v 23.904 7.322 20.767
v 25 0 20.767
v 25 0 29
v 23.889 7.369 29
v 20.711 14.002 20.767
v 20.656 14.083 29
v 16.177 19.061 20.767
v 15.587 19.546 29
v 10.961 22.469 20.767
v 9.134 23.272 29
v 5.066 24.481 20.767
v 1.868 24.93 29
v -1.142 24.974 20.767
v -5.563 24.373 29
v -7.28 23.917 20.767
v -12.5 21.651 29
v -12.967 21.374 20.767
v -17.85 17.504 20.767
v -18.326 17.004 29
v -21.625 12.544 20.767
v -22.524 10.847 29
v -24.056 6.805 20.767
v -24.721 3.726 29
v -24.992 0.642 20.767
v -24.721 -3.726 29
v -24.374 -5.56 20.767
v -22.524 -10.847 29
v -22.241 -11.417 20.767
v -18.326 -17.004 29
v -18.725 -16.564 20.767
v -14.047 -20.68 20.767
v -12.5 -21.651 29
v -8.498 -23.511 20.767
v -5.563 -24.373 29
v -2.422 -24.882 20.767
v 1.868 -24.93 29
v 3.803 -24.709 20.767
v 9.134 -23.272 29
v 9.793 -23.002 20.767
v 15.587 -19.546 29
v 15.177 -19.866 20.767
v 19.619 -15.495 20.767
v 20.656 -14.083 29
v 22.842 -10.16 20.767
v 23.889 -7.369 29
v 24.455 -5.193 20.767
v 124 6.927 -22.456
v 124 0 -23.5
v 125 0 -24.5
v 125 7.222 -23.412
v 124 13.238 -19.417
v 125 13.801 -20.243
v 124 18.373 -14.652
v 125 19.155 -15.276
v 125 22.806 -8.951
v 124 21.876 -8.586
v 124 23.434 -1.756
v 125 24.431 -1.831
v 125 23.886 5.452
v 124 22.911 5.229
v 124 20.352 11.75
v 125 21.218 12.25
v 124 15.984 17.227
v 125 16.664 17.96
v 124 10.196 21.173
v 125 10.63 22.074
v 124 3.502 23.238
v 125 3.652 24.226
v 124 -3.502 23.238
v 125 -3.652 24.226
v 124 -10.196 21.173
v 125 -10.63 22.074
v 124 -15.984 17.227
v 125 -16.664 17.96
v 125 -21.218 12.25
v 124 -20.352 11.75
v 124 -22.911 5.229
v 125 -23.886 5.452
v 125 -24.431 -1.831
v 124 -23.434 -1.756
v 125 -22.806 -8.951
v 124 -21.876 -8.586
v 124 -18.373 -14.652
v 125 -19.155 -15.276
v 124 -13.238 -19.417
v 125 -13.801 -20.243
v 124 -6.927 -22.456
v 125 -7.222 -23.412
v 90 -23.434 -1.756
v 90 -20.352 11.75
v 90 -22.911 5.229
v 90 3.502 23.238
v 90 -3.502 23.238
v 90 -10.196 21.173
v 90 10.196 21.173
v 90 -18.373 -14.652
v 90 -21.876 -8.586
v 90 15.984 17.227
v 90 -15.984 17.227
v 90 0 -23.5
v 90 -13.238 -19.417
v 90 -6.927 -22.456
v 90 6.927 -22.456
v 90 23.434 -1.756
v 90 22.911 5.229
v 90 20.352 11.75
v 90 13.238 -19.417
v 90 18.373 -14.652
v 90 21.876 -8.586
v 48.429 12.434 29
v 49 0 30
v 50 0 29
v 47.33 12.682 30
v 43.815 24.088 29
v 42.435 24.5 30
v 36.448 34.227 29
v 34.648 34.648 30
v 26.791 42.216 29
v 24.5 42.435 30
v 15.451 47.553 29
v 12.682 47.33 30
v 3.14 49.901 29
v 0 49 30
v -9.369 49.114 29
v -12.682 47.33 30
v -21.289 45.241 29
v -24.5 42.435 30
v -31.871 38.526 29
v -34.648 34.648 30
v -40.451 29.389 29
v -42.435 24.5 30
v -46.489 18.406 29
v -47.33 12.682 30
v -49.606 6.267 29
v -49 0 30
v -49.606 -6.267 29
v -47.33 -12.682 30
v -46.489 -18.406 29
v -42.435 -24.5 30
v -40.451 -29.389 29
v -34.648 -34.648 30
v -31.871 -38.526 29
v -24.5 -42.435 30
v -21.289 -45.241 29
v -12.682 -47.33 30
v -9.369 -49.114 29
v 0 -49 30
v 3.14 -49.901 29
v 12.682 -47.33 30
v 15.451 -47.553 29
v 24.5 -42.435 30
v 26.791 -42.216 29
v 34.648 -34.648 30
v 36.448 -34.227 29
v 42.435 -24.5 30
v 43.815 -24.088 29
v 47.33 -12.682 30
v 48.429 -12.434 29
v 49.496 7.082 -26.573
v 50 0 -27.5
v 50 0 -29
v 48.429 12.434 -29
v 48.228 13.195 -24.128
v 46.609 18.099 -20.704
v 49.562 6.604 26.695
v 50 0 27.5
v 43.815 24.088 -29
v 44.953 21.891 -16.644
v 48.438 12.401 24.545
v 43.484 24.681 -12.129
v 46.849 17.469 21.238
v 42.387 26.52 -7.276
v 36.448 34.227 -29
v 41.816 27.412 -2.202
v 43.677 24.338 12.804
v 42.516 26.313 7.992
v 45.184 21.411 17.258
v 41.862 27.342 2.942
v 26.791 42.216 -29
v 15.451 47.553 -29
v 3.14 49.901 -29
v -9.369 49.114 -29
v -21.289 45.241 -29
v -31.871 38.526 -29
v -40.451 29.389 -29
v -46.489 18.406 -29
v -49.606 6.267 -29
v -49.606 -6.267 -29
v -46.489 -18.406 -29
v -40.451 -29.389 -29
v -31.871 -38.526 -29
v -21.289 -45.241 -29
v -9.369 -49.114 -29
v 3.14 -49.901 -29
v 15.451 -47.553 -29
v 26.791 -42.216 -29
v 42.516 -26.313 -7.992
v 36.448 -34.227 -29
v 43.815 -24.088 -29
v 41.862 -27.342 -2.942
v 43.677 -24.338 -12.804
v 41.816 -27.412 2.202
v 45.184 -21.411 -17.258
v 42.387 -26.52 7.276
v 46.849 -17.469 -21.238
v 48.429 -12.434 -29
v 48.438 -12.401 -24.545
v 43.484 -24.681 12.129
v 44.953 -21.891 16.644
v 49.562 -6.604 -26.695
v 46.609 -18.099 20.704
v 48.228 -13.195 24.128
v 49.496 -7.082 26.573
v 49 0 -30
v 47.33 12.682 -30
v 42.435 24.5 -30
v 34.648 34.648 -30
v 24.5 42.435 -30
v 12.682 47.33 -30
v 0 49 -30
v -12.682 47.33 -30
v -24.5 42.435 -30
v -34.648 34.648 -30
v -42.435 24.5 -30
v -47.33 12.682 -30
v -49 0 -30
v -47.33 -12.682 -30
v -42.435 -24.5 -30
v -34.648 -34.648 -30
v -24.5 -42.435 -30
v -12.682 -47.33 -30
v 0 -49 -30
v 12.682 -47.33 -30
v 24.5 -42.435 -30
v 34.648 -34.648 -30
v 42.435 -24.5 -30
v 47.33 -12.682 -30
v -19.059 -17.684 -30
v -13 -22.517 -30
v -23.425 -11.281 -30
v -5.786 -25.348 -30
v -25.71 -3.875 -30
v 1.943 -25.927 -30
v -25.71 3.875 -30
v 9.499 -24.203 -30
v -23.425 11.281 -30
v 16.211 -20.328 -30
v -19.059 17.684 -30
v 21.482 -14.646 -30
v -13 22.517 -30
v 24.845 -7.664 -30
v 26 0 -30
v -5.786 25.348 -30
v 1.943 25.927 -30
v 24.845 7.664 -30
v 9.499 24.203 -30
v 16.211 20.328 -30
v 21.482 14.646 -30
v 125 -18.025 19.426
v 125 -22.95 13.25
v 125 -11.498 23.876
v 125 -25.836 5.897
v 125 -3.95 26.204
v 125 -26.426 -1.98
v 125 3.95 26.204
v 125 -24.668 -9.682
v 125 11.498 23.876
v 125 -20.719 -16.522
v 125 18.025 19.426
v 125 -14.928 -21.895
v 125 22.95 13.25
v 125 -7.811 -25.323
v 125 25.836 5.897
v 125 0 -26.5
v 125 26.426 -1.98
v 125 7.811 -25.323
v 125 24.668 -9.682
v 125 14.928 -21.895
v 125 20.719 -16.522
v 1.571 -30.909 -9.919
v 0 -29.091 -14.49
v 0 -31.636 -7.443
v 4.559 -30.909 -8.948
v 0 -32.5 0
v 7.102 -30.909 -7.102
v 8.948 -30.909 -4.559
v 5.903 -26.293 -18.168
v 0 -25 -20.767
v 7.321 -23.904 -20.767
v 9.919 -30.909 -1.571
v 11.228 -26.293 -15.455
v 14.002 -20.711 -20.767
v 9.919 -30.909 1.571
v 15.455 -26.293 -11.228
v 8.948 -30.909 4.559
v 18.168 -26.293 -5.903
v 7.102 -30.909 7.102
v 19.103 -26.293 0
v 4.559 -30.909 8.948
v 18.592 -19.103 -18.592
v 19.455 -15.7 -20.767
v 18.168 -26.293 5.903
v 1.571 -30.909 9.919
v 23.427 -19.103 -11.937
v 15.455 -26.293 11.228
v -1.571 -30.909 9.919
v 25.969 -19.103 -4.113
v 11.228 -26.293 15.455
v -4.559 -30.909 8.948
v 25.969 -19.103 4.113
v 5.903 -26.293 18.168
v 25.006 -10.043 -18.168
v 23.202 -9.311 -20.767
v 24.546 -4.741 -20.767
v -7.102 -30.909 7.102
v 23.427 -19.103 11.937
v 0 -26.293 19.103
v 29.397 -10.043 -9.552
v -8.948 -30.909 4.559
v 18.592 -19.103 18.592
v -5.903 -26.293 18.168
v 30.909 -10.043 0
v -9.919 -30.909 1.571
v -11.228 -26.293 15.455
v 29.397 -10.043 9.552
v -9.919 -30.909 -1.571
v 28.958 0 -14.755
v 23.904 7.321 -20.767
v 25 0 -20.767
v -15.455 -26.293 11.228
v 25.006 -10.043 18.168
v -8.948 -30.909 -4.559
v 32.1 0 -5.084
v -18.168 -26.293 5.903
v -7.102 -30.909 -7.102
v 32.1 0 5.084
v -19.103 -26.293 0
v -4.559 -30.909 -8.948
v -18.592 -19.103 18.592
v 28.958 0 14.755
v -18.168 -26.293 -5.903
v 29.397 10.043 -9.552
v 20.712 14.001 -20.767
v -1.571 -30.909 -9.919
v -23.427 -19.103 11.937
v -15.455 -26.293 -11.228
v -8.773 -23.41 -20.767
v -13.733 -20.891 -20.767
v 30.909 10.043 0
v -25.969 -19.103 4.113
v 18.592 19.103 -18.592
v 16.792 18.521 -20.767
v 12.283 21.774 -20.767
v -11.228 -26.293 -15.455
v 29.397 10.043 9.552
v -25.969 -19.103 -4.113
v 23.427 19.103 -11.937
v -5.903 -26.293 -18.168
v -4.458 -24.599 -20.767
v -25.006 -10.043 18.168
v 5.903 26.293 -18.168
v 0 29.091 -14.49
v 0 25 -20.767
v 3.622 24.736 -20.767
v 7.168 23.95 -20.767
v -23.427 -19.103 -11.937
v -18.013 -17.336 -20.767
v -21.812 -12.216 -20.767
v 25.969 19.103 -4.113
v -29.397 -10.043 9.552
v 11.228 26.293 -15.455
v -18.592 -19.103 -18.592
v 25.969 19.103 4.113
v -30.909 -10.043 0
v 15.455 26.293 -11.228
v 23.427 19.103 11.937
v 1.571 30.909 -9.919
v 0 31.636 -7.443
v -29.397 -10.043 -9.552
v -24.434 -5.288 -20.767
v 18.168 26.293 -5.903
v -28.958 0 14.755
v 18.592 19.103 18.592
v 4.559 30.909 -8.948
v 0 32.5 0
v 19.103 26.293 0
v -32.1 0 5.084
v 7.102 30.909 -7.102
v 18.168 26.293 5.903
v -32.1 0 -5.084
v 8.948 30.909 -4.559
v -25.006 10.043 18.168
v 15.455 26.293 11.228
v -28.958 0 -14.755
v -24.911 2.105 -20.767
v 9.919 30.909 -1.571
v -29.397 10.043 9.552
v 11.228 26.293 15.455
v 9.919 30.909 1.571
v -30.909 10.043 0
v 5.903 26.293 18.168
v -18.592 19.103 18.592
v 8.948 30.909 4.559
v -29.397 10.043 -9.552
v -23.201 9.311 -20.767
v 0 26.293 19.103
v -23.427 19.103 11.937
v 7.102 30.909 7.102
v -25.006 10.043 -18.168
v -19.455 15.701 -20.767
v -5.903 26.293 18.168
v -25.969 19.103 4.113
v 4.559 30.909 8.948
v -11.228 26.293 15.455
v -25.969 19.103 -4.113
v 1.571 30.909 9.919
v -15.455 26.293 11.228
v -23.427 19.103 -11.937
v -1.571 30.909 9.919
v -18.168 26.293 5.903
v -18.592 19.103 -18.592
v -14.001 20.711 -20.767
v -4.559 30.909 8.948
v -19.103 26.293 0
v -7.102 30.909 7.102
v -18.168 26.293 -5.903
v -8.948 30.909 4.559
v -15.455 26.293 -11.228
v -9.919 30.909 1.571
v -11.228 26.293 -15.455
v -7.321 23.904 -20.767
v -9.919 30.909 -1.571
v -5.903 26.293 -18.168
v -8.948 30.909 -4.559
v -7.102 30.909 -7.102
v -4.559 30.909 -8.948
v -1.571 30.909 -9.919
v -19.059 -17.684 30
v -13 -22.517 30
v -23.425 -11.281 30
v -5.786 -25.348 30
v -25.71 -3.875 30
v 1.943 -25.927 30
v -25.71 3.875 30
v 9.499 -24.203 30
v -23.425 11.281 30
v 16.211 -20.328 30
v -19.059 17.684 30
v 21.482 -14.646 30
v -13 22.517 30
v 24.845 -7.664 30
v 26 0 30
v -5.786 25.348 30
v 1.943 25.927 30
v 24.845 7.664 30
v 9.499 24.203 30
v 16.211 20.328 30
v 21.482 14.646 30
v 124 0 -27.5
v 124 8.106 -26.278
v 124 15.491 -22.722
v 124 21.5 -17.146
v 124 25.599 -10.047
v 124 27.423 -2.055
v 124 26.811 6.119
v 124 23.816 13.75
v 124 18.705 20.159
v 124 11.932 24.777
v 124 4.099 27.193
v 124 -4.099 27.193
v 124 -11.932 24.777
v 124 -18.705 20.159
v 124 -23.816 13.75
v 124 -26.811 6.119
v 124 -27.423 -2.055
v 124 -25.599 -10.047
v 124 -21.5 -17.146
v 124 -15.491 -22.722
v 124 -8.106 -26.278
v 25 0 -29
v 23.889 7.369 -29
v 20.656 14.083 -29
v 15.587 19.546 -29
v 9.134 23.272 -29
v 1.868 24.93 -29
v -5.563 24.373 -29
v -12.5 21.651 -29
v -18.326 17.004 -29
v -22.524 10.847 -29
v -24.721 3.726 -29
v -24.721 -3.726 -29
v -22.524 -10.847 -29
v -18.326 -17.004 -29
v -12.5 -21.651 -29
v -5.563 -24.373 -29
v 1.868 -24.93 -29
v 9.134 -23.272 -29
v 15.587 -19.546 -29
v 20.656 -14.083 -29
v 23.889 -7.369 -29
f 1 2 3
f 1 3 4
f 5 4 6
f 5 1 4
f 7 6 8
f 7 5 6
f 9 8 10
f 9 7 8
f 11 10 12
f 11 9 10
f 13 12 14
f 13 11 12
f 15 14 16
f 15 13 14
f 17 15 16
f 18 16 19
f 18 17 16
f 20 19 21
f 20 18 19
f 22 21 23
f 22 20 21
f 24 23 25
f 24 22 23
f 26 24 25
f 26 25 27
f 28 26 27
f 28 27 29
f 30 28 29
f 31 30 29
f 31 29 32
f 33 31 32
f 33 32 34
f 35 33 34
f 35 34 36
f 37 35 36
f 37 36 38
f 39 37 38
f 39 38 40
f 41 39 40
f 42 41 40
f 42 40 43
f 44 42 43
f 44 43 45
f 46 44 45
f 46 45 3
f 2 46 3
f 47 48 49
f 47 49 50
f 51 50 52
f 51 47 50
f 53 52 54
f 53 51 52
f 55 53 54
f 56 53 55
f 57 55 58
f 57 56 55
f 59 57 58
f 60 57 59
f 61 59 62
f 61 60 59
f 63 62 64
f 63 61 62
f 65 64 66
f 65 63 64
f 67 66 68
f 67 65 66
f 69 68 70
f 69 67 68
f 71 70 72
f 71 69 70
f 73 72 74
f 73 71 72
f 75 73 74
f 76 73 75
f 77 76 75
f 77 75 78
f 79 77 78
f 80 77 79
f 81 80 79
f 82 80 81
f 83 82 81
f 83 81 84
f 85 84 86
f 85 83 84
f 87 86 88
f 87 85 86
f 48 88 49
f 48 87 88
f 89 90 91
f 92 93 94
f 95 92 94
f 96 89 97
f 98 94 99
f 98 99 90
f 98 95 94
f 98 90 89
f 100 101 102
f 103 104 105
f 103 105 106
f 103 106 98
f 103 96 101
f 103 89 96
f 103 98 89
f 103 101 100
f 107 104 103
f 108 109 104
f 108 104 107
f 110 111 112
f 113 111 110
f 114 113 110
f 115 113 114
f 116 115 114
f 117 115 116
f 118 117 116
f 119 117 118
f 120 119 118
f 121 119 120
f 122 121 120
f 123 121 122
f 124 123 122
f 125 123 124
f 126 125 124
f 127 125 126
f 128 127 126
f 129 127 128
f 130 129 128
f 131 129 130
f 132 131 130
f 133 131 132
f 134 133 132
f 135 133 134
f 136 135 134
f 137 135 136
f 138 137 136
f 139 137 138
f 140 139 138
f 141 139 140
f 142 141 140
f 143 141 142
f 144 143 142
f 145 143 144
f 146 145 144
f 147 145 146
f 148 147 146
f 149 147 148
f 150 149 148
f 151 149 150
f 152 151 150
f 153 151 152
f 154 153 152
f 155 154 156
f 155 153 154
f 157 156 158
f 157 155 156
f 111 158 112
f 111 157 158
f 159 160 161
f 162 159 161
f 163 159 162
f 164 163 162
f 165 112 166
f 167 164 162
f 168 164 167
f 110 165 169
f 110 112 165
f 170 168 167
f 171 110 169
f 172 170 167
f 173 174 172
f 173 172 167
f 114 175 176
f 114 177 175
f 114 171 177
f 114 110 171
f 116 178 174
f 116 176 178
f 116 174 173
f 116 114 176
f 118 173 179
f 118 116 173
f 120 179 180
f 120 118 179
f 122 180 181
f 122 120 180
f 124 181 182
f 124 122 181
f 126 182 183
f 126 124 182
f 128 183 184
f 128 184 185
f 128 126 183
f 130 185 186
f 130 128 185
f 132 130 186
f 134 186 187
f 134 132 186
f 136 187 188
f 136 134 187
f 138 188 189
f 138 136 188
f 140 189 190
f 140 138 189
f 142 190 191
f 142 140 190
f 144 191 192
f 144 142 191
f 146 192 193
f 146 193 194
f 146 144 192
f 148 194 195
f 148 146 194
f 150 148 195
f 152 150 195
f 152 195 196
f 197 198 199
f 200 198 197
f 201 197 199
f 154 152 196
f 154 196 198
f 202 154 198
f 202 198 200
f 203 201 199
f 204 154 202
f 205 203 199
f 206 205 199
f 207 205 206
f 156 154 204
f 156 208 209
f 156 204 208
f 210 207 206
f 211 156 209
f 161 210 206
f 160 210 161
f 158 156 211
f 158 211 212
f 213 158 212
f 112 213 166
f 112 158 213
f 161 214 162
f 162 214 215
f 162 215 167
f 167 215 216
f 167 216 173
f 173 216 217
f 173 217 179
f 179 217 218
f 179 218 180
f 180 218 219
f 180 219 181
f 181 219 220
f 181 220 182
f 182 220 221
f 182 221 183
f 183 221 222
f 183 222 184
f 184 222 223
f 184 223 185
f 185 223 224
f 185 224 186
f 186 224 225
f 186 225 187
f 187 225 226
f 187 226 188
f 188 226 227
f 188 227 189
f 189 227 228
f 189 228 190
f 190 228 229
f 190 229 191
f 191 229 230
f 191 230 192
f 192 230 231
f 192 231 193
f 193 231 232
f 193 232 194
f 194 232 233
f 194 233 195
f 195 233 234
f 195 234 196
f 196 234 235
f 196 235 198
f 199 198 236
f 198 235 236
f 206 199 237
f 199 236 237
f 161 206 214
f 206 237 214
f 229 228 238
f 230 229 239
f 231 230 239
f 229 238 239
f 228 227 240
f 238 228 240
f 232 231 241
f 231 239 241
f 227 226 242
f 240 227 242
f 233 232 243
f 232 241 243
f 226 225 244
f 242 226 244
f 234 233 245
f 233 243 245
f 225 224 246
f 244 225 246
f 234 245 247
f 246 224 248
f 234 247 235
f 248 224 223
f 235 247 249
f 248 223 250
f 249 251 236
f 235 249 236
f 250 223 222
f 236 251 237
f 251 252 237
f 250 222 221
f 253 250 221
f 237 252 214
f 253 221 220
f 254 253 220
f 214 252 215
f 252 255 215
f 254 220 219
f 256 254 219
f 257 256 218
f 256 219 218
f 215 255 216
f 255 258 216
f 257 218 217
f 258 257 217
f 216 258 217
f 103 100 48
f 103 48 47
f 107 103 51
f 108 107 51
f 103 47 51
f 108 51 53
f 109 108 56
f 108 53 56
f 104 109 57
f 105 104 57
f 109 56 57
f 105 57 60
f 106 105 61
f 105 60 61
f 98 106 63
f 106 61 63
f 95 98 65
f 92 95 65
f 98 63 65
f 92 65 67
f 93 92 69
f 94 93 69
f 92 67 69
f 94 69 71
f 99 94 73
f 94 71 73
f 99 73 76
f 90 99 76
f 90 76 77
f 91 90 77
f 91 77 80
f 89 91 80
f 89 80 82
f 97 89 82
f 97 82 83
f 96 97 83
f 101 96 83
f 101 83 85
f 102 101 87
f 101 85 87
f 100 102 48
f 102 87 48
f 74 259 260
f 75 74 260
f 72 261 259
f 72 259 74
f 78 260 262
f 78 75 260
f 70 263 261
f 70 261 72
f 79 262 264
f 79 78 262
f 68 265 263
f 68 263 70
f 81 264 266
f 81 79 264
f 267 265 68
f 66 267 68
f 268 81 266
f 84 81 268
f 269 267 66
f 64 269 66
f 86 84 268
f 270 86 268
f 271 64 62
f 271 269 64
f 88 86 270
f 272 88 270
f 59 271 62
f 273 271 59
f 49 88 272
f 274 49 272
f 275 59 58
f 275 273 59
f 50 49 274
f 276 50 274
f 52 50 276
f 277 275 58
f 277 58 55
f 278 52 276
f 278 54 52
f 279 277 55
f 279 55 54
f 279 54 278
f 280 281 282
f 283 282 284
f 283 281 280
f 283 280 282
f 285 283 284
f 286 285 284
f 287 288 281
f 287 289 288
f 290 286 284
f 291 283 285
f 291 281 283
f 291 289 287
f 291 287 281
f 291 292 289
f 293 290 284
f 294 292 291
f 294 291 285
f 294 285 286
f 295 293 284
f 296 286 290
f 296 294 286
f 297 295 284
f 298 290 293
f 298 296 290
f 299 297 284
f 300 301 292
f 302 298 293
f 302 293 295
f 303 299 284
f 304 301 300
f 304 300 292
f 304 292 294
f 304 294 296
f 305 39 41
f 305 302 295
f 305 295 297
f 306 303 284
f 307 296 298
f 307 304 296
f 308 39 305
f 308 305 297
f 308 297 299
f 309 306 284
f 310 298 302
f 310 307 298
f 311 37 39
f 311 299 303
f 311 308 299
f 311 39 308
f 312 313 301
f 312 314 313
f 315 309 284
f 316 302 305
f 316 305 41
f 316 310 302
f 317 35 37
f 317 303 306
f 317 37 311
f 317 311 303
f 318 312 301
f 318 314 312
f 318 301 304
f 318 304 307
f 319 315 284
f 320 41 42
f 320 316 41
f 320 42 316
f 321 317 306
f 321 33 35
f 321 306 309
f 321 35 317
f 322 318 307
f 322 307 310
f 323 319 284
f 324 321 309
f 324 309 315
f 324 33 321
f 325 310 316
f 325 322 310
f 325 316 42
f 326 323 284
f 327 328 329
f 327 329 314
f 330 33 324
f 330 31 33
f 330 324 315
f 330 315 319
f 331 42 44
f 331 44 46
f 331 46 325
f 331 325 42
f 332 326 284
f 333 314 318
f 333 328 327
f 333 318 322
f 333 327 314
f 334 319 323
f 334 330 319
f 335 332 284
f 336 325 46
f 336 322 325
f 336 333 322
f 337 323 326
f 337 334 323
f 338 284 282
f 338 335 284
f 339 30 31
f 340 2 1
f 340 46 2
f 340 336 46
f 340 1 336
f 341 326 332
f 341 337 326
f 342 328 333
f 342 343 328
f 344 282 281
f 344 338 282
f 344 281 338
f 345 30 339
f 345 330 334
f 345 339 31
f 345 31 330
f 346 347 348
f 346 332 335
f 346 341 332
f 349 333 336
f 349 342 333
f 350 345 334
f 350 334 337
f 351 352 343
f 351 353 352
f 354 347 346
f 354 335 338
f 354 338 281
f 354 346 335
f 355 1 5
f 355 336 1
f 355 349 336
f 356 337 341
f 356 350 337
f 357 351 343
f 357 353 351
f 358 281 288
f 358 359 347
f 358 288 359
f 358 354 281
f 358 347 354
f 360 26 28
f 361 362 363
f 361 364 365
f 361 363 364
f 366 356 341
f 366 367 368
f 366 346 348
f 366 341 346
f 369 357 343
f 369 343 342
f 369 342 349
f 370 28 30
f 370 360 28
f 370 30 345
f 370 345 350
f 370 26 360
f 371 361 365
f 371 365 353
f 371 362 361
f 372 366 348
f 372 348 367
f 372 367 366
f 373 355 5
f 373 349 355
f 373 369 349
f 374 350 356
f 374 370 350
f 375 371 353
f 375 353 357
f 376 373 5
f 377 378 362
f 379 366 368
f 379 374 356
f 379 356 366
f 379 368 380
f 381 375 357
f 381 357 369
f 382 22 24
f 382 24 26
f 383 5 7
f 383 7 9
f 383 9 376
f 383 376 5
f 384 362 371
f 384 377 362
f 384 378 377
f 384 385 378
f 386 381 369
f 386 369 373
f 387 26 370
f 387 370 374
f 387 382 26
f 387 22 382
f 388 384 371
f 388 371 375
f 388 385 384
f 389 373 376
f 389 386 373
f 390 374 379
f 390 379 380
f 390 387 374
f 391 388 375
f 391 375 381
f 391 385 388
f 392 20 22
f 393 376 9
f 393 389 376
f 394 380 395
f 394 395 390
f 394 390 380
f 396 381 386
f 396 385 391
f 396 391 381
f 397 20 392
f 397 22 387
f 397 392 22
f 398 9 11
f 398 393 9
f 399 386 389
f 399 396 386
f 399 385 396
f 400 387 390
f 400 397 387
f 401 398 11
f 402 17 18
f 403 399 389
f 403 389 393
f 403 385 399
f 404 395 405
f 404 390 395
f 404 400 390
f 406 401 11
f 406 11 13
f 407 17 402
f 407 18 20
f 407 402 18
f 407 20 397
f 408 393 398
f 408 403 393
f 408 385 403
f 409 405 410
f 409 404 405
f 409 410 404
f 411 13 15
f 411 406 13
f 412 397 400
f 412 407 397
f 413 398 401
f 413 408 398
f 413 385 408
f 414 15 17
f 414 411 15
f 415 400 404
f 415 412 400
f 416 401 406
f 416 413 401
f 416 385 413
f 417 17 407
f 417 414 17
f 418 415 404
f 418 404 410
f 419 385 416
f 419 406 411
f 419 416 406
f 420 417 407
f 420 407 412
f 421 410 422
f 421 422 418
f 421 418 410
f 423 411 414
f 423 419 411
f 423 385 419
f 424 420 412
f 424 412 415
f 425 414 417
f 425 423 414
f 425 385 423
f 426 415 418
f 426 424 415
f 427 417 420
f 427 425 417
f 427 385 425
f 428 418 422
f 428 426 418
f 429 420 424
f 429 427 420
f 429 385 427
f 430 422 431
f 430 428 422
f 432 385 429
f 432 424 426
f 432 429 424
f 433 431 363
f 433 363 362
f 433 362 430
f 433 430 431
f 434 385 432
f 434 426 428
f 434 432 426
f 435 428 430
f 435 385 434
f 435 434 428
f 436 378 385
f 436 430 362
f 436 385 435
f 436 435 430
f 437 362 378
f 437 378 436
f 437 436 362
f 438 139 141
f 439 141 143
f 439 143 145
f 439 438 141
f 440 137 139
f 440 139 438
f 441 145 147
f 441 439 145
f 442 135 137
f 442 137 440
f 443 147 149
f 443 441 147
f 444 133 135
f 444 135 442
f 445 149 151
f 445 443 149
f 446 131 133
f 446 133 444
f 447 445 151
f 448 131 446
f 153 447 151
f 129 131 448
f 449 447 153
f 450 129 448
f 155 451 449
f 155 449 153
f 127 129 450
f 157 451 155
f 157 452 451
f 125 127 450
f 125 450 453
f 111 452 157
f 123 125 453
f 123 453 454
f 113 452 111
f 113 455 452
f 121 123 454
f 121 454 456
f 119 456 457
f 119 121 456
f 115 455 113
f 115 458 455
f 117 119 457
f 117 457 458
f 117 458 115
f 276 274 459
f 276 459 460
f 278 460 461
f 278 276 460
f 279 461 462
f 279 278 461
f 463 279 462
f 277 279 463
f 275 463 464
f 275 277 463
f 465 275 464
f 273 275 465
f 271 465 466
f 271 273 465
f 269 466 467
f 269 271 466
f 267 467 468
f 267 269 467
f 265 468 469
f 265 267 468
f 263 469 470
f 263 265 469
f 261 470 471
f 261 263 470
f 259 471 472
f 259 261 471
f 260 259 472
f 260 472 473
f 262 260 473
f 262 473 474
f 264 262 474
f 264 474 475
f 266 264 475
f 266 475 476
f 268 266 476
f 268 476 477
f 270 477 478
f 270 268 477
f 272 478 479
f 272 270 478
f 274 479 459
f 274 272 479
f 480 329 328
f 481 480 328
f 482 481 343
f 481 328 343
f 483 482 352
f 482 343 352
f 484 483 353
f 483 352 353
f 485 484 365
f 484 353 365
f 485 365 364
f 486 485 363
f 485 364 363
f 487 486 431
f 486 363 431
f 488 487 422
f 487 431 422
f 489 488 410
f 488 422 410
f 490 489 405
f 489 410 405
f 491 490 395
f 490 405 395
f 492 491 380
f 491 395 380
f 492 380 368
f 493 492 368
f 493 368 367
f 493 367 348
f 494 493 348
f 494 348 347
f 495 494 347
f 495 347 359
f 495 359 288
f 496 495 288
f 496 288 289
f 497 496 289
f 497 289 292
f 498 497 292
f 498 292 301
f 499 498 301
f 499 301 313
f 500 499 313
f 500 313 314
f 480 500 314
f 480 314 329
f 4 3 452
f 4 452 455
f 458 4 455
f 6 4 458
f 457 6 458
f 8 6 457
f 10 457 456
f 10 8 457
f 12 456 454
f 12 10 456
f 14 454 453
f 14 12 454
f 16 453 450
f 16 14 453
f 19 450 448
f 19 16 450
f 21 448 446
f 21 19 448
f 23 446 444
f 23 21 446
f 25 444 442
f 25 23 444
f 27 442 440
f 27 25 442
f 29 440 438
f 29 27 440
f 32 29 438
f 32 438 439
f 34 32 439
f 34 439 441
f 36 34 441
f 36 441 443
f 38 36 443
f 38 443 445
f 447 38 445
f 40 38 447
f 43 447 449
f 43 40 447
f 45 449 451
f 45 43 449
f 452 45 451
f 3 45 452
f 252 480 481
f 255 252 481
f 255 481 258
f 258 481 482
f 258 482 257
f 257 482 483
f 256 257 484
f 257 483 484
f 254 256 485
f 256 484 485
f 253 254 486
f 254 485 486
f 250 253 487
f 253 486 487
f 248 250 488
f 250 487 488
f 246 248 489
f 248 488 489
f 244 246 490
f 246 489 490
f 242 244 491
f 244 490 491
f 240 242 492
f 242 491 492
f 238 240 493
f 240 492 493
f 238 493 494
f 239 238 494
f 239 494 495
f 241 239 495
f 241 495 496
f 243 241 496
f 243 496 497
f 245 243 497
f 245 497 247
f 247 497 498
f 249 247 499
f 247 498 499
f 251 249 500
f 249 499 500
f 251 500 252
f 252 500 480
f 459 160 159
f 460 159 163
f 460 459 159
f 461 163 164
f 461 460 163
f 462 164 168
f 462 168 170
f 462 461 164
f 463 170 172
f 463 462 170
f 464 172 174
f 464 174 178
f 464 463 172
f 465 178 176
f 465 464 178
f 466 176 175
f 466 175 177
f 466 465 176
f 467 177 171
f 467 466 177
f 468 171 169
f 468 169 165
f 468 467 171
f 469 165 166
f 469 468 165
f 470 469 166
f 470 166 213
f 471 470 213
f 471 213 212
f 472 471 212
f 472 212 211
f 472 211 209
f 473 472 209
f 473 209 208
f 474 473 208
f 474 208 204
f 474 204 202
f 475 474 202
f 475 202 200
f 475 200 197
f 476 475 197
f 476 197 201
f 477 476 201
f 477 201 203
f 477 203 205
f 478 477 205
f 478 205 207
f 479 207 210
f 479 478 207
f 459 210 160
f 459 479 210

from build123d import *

# Parameters (mm, degrees)
BOSS_EXTRUDE1_DEPTH      = 30
BOSS_EXTRUDE1_DEPTH_BACK = 30
SKETCH3_R                = 50
SKETCH3_R_2              = 25
SKETCH5_R                = 27.5
BOSS_EXTRUDE2_DEPTH      = 90
SKETCH6_R                = 23.5
CUT_EXTRUDE1_DEPTH       = 35
CHAMFER1_SIZE            = 1
CHAMFER3_SIZE            = 1
CHAMFER5_SIZE            = 1
CHAMFER6_SIZE            = 1
CHAMFER7_SIZE            = 1


with BuildPart() as part:
    # Sketch3 → Boss-Extrude1 (new, two sides: drawn at the far end of the back side and taken through both)
    with BuildSketch(Plane.XY.offset(-BOSS_EXTRUDE1_DEPTH_BACK)):
        Circle(SKETCH3_R)
        Circle(SKETCH3_R_2, mode=Mode.SUBTRACT)
    extrude(amount=BOSS_EXTRUDE1_DEPTH + BOSS_EXTRUDE1_DEPTH_BACK)

    # Sketch4 → Cut-Revolve5 (revolve, cut)
    with BuildSketch(Plane(origin=(0, 0, 0), x_dir=(0, 0, -1), z_dir=(1, 0, 0))):
        with BuildLine():
            Line((0, 32.5), (0, -32.5))
            ThreePointArc((0, -32.5), (32.5, 0), (0, 32.5))
        make_face()
    revolve(axis=Axis((0, 32.5, 0), (0, -1, 0)), mode=Mode.SUBTRACT)

    # Sketch5 → Boss-Extrude2 (add)
    with BuildSketch(Plane(origin=(125, 0, 0), x_dir=(0, 0, -1), z_dir=(1, 0, 0))):
        Circle(SKETCH5_R)
    extrude(amount=-BOSS_EXTRUDE2_DEPTH)

    # Sketch6 → Cut-Extrude1 (cut)
    with BuildSketch(Plane(origin=(125, 0, 0), x_dir=(0, 0, -1), z_dir=(1, 0, 0))):
        Circle(SKETCH6_R)
    extrude(amount=-CUT_EXTRUDE1_DEPTH, mode=Mode.SUBTRACT)

    # Chamfer1
    chamfer1_edges = [part.edges().sort_by_distance(p)[0] for p in [
        (-50, 0, -30),
    ]]
    chamfer(chamfer1_edges, length=CHAMFER1_SIZE)

    # Chamfer3
    chamfer3_edges = [part.edges().sort_by_distance(p)[0] for p in [
        (-25, 0, -30),
    ]]
    chamfer(chamfer3_edges, length=CHAMFER3_SIZE)

    # Chamfer5
    chamfer5_edges = [part.edges().sort_by_distance(p)[0] for p in [
        (-50, 0, 30),
    ]]
    chamfer(chamfer5_edges, length=CHAMFER5_SIZE)

    # Chamfer6
    chamfer6_edges = [part.edges().sort_by_distance(p)[0] for p in [
        (-25, 0, 30),
    ]]
    chamfer(chamfer6_edges, length=CHAMFER6_SIZE)

    # Chamfer7
    chamfer7_edges = [part.edges().sort_by_distance(p)[0] for p in [
        (125, 0, 23.5),
        (125, 0, 27.5),
    ]]
    chamfer(chamfer7_edges, length=CHAMFER7_SIZE)


solid = part.part
